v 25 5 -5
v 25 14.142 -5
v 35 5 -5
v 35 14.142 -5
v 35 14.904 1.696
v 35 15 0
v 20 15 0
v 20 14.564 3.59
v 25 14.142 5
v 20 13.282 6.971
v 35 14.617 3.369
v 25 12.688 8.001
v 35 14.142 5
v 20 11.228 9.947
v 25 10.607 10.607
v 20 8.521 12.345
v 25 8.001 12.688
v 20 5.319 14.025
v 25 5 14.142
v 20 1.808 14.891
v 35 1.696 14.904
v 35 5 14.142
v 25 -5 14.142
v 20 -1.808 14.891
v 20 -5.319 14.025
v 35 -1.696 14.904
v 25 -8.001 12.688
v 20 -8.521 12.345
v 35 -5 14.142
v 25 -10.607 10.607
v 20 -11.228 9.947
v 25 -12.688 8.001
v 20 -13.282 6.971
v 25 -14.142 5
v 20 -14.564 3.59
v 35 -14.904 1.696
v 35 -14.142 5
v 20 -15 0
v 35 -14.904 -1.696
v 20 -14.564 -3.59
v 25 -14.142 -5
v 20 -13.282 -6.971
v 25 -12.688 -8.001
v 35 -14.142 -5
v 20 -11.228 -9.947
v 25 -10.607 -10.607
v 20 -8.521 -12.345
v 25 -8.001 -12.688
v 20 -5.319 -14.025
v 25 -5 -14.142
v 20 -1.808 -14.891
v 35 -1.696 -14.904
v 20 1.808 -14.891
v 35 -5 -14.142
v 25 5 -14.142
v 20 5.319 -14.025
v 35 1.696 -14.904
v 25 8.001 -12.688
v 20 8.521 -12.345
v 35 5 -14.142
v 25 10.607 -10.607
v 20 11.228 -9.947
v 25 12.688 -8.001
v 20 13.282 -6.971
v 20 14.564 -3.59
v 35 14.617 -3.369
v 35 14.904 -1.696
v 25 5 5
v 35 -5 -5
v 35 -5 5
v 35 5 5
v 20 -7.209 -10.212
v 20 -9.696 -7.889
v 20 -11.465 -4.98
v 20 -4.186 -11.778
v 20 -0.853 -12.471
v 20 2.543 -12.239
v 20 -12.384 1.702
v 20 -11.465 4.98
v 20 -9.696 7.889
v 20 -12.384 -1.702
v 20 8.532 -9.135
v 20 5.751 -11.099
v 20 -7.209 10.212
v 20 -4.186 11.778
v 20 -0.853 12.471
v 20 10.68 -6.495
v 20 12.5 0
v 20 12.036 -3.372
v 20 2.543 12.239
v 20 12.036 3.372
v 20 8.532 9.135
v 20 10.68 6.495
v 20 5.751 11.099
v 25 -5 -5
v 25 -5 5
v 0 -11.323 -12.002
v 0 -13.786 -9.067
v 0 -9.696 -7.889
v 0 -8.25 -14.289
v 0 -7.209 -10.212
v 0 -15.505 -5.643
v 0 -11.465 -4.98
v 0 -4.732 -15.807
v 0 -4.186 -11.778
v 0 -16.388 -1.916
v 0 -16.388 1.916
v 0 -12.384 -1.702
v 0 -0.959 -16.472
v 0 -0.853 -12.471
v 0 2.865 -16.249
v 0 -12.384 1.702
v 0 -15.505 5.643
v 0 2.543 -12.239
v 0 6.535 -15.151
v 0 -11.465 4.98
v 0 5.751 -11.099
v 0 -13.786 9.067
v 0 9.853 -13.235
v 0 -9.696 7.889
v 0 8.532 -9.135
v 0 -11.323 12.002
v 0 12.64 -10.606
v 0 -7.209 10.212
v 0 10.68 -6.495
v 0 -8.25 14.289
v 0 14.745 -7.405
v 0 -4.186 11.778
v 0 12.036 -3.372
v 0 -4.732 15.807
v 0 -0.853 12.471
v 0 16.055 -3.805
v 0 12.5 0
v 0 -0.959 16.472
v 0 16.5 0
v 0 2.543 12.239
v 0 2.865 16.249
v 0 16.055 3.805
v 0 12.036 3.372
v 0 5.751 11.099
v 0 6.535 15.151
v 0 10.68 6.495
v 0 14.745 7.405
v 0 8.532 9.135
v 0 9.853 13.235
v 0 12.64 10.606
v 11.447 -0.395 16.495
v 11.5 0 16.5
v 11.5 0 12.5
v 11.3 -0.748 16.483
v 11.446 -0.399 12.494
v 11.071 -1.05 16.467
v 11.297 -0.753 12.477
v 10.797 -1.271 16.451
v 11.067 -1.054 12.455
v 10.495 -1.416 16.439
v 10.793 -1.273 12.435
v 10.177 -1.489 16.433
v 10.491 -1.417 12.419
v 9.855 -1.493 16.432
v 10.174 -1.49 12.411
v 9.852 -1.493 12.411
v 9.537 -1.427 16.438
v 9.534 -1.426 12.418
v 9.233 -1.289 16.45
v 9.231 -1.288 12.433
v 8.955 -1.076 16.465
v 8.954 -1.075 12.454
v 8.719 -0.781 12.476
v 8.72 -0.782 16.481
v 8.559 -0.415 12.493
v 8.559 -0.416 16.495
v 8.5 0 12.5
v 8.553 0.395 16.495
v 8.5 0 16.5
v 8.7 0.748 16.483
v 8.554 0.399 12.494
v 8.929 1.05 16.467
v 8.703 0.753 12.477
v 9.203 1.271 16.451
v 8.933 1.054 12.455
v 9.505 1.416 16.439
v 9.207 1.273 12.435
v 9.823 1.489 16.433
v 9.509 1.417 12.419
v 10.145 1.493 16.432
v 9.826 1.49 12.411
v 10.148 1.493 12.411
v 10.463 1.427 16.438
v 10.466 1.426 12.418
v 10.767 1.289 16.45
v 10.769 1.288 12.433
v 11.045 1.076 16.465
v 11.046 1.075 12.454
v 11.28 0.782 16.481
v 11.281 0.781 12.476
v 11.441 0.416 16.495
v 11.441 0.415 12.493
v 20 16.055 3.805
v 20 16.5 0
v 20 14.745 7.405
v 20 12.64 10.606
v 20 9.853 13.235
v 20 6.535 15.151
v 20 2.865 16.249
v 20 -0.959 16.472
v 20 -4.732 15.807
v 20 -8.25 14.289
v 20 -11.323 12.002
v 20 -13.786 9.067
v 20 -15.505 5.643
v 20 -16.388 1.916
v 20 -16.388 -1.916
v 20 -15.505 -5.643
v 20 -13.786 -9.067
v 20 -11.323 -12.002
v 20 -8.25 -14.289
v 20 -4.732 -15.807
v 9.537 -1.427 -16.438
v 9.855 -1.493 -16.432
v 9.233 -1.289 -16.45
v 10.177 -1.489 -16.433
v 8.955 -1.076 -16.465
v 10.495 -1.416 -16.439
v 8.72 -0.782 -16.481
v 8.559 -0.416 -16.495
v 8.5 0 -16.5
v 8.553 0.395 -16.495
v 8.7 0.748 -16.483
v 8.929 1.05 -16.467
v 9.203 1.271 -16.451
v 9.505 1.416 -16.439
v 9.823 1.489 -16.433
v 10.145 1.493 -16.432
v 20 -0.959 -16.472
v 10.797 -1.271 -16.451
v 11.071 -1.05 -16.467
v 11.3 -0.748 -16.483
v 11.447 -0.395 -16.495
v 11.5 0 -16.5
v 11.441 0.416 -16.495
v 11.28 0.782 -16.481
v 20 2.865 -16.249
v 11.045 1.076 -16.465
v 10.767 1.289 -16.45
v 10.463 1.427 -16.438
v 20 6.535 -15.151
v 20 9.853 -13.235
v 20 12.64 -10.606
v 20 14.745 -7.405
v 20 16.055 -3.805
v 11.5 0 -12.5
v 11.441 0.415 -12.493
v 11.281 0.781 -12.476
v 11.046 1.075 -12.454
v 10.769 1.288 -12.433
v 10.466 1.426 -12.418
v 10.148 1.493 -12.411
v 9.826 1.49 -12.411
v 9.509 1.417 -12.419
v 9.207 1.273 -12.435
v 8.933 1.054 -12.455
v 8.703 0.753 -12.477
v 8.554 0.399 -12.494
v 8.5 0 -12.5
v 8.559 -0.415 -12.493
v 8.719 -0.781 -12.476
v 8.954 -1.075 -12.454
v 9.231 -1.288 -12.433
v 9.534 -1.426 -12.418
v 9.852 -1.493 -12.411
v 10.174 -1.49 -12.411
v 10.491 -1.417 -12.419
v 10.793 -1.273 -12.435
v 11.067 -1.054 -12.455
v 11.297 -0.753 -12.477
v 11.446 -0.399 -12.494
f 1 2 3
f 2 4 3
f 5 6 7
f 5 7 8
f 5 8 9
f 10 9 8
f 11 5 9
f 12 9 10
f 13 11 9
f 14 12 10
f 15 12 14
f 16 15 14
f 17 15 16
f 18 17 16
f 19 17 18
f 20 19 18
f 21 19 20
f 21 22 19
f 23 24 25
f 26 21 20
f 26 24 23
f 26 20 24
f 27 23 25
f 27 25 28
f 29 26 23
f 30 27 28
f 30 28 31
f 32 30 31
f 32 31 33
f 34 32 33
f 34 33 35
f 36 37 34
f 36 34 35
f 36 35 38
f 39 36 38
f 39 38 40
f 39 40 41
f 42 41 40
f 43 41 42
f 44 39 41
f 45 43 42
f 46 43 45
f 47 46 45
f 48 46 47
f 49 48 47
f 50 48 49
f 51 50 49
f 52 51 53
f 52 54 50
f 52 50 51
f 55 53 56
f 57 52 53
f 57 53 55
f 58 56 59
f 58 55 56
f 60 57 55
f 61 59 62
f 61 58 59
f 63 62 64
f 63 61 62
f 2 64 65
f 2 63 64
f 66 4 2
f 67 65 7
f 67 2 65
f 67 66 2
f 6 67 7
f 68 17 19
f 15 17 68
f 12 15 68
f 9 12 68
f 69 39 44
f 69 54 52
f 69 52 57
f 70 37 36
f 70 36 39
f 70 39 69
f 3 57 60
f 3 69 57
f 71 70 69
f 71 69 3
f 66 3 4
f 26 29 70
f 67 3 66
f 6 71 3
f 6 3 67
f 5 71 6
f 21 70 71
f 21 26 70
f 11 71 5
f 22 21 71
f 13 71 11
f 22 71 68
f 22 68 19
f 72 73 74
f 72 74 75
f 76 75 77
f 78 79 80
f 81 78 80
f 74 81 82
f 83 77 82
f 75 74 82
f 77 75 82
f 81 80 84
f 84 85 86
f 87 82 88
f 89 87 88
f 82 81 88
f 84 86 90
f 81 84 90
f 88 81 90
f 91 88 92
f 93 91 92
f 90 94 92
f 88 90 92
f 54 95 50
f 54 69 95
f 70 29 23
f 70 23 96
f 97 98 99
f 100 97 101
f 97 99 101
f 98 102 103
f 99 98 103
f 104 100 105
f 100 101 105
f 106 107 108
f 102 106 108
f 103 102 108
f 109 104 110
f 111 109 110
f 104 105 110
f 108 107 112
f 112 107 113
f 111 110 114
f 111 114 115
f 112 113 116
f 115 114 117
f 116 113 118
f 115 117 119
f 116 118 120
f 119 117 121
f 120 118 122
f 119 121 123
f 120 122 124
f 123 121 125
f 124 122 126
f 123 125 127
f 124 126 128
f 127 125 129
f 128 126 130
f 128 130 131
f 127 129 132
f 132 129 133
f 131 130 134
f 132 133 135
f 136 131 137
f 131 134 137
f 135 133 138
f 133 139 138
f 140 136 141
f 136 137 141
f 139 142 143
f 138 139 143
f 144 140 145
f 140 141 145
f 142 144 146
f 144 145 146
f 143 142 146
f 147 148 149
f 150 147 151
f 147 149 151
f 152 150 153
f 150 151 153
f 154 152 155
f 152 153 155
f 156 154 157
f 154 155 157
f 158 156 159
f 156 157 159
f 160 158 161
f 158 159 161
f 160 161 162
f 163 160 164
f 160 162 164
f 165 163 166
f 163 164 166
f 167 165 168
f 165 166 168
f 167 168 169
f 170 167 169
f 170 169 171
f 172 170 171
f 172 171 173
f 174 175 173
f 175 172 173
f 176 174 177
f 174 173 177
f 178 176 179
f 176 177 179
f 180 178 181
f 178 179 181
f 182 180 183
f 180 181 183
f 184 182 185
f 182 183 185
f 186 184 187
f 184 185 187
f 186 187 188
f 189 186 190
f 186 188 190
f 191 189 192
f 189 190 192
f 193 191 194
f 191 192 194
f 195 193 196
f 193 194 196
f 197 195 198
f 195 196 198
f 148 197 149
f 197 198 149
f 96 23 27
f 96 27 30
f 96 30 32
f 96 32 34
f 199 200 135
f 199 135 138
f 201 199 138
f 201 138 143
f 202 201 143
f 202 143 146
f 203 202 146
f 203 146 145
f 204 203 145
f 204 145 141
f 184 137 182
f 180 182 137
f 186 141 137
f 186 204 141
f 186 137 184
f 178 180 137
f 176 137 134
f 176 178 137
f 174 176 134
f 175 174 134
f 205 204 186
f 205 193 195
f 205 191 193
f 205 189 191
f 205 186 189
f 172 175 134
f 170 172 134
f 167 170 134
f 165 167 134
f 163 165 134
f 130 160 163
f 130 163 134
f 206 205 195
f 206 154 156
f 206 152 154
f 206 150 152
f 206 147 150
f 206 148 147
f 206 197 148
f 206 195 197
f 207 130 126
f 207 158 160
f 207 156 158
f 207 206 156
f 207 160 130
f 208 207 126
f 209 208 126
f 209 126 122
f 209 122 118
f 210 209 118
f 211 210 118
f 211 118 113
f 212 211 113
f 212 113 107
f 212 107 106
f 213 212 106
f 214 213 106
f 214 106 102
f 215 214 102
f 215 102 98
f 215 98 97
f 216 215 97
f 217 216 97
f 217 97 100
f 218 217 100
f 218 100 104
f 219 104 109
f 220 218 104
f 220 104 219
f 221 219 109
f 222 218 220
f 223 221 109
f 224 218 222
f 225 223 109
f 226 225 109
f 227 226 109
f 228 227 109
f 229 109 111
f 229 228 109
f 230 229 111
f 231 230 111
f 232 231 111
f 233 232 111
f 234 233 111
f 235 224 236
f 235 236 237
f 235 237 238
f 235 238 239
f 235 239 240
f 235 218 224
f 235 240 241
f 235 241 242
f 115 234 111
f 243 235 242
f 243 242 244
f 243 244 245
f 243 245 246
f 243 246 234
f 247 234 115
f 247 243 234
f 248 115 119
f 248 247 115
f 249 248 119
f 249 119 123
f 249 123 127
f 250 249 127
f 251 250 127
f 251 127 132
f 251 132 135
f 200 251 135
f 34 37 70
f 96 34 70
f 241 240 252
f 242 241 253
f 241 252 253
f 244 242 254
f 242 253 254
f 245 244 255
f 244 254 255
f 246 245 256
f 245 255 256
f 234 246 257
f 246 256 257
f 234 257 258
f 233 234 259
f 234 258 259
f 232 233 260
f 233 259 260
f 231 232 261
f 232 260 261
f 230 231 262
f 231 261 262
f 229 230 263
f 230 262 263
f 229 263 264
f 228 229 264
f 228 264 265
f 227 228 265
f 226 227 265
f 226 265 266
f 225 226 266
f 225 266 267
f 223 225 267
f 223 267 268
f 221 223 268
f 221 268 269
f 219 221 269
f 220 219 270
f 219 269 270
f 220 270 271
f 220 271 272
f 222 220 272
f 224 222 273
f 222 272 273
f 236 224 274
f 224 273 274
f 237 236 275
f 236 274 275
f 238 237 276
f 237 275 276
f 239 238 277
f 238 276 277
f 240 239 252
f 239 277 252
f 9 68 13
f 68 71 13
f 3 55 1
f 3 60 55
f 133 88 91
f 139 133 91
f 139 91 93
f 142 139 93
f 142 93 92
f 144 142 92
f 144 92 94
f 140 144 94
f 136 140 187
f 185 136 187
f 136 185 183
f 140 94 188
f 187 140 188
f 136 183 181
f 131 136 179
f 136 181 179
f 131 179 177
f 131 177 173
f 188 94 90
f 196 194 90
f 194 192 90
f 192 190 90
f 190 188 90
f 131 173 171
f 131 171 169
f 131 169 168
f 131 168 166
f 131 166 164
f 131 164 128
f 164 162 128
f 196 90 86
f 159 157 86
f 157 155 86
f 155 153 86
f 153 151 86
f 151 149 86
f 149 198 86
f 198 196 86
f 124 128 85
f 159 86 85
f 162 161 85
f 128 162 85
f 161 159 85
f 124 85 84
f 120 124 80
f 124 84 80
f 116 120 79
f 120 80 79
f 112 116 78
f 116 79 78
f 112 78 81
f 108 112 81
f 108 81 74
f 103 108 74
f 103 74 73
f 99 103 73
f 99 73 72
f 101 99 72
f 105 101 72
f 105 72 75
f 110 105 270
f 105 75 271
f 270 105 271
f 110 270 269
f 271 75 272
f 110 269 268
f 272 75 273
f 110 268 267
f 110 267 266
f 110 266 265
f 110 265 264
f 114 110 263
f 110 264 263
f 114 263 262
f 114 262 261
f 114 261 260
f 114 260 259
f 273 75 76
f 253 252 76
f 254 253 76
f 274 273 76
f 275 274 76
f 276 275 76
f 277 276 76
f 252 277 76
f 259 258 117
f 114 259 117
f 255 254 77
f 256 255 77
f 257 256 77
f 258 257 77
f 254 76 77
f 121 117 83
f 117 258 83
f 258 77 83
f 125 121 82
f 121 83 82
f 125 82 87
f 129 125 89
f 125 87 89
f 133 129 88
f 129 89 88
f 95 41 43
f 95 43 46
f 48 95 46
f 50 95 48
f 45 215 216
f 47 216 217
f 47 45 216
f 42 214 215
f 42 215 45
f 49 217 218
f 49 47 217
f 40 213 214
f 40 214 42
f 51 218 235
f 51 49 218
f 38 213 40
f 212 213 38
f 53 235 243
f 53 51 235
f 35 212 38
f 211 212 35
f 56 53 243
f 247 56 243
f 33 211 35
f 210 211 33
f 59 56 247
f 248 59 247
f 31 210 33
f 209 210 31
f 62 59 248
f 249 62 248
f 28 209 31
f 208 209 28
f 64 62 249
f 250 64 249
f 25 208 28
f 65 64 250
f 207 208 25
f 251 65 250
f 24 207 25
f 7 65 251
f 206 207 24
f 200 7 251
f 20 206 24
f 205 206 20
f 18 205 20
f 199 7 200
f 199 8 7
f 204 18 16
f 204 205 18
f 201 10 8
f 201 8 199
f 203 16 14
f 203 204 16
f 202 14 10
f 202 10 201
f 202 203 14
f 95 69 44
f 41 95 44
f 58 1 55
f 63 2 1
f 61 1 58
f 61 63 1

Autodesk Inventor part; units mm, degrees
ref_plane "YZ Plane" through (0, 0, 0) normal (1, 0, 0) x (0, 1, 0)
ref_plane "XZ Plane" through (0, 0, 0) normal (0, 1, 0) x (-1, 0, 0)
ref_plane "XY Plane" through (0, 0, 0) normal (0, 0, 1) x (1, 0, 0)
sketch "Эскиз1" plane through (0, 0, 0) normal (0, 0, 1) x (1, 0, 0)
  line L0 (0, 0) -> (20, 0)
  line L1 (0, 0) -> (0, 12.5)
  line L2 (0, 12.5) -> (0, 16.5)
  line L3 (0, 12.5) -> (20, 12.5)
  line L4 (20, 0) -> (20, 15)
  line L5 (20, 15) -> (35, 15)
  line L6 (35, 15) -> (35, 0)
  line L7 (35, 0) -> (20, 0)
  line L8 (0, 16.5) -> (20, 16.5)
  line L9 (20, 15) -> (20, 16.5)
  dimension "d0" = 20
  dimension "d1" = 12.5
  dimension "d2" = 4
  dimension "d5" = 15
  dimension "d6" = 15
revolve "Вращение1" add sketch "Эскиз1" angle 360 about axis through (0, 0, 0) along (1, 0, 0) contours L4 L5 L6 L7 | L2 L8 L9 L4 L3
sketch "Эскиз2" plane through (0, 0, 0) normal (0, 0, 1) x (1, 0, 0)
  line L0 (0, 0) -> (10, 0)
  circle A0 centre (10, 0) radius 1.5
  dimension "d8" = 10
  dimension "d9" = 3
extrude "Выдавливание1" cut sketch "Эскиз2" along normal mid plane 40
thread "Резьба1" size "M3x0.5" class "6H" standard "ANSI Metric M Profile" full length
sketch "Эскиз3" plane through (35, 0, 0) normal (1, 0, 0) x (0, 0, -1)
  line L0 (0, 0) -> (-5, 0)
  line L1 (-5, 0) -> (-5, 20)
  line L2 (-5, 20) -> (5, 20)
  line L3 (5, 20) -> (5, -20)
  line L4 (5, -20) -> (-5, -20)
  line L5 (-5, -20) -> (-5, 0)
  circle A0 centre (0, 0) radius 15 projected
  line L6 (0, 0) -> (0, 5)
  line L7 (0, 5) -> (-20, 5)
  line L8 (-20, 5) -> (-20, -5)
  line L9 (-20, -5) -> (20, -5)
  line L10 (20, -5) -> (20, 5)
  line L11 (20, 5) -> (0, 5)
  point P0 (-5, -5)
  point P1 (-14.1421, -5)
  point P2 (-5, -14.1421)
  point P3 (14.1421, -5)
  point P4 (5, -5)
  point P5 (5, -14.1421)
  point P6 (5, 5)
  point P7 (14.1421, 5)
  point P8 (5, 14.1421)
  point P9 (-14.1421, 5)
  point P10 (-5, 5)
  point P11 (-5, 14.1421)
  dimension "d14" = 5
  dimension "d15" = 10
  dimension "d16" = 5
  dimension "d17" = 10
extrude "Выдавливание2" cut sketch "Эскиз3" against normal blind 10 contours L7 A0 L1 | L5 A0 L9 | L3 A0 L11 | L9 A0 L3
properties part number "Втулка двигатель, вал"
